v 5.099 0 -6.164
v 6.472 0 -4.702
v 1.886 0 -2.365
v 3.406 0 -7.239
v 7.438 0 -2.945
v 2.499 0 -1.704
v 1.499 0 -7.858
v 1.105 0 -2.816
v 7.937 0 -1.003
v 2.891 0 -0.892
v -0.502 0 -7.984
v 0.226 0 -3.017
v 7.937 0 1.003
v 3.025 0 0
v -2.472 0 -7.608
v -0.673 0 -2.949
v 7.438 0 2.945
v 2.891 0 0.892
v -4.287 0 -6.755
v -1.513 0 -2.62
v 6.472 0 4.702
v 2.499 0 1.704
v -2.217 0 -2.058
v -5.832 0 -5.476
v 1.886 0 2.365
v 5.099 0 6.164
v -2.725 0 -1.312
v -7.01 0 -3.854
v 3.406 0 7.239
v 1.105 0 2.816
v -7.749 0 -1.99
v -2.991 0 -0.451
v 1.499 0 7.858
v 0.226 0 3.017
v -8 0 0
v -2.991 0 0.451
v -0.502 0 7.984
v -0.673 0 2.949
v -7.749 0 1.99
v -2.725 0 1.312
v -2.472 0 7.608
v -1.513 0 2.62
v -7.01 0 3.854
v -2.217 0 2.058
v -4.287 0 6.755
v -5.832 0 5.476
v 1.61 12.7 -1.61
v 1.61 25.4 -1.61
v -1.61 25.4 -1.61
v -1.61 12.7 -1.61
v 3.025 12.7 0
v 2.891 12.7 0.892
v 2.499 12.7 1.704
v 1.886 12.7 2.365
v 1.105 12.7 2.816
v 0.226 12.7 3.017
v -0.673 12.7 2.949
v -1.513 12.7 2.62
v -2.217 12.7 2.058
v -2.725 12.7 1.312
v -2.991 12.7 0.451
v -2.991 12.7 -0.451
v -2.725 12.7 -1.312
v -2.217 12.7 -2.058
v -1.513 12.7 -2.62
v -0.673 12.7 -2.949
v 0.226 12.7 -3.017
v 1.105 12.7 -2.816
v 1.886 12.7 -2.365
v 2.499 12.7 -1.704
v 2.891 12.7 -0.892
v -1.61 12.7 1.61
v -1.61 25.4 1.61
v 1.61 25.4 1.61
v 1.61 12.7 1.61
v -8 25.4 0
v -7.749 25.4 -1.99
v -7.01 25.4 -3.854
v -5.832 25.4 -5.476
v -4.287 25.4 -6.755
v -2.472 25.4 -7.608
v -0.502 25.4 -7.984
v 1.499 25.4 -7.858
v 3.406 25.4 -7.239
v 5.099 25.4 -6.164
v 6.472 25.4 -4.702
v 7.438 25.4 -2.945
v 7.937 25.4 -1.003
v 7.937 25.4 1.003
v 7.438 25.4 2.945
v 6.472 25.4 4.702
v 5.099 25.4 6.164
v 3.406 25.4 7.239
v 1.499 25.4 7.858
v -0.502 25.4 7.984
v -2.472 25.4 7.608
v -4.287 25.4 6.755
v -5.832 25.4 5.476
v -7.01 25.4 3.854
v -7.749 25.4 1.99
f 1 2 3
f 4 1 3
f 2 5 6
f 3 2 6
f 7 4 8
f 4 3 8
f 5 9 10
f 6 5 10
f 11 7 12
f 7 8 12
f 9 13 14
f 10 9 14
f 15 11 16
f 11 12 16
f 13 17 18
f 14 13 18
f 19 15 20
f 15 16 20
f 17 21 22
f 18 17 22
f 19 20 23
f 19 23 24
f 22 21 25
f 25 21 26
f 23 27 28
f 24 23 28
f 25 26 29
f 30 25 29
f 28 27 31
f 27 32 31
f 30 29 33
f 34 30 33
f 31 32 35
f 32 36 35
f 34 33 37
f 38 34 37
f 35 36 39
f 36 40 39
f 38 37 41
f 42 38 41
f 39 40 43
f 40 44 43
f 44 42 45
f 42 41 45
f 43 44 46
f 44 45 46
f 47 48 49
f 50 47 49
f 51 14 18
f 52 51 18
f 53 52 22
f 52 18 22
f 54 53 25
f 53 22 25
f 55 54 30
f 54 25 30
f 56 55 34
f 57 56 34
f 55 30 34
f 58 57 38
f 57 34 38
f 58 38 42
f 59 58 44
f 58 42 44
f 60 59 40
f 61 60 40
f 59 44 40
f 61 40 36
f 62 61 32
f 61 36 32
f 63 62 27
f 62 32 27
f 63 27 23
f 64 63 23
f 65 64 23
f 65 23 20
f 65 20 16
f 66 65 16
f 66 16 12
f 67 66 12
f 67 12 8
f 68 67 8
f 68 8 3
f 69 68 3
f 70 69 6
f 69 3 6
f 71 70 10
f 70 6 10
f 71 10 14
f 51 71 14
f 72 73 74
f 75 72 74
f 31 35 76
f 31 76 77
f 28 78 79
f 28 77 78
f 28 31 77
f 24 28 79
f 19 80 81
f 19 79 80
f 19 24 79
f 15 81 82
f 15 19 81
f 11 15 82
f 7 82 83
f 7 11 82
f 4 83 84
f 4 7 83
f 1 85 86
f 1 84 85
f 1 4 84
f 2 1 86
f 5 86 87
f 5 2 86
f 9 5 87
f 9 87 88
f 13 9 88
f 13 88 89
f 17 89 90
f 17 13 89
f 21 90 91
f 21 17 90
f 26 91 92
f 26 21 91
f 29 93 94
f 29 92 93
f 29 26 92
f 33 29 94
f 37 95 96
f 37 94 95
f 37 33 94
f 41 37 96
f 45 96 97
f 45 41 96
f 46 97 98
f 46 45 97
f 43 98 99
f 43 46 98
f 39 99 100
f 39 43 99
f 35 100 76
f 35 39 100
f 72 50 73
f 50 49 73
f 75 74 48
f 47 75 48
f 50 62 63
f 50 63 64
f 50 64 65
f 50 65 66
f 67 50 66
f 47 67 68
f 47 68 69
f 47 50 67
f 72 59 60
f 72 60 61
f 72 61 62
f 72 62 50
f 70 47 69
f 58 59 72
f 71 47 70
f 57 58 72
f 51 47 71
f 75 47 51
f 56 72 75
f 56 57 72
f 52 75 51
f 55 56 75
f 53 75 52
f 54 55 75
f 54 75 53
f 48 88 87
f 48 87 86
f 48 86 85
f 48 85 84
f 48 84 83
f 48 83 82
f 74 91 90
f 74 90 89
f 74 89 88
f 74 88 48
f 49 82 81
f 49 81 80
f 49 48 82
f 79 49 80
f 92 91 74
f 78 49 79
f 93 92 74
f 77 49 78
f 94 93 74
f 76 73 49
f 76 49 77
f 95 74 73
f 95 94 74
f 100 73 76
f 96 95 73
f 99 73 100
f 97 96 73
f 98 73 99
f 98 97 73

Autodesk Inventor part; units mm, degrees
ref_plane "YZ Plane" through (0, 0, 0) normal (1, 0, 0) x (0, 1, 0)
ref_plane "XZ Plane" through (0, 0, 0) normal (0, 1, 0) x (-1, 0, 0)
ref_plane "XY Plane" through (0, 0, 0) normal (0, 0, 1) x (1, 0, 0)
sketch "Sketch1" plane through (0, 0, 0) normal (0, 1, 0) x (-1, 0, 0)
  circle A0 centre (0, 0) radius 8
  dimension "d0" = 16
extrude "Extrusion1" add sketch "Sketch1" along normal blind 25.4
sketch "Sketch3" plane through (0, 25.4, 0) normal (0, 1, 0) x (1, 0, 0)
  line L0 (-1.61, -1.61) -> (1.61, -1.61)
  line L1 (1.61, -1.61) -> (1.61, 1.61)
  line L2 (1.61, 1.61) -> (-1.61, 1.61)
  line L3 (-1.61, 1.61) -> (-1.61, -1.61)
  point P0 (0, 0)
  dimension "d13" = 3.22
  dimension "d15" = 1.61
  dimension "d16" = 1.61
extrude "Extrusion2" cut sketch "Sketch3" against normal blind 12.7
sketch "Sketch4" plane through (0, 0, 0) normal (0, -1, 0) x (1, 0, 0)
  circle A0 centre (0, 0) radius 3.025
  dimension "d19" = 6.05
extrude "Extrusion3" cut sketch "Sketch4" against normal blind 12.7
equation "\"d15\" = 0.5 * d13"
equation "\"d16\" = 0.5 * d13"
properties part number "Wheel_Coupler"
